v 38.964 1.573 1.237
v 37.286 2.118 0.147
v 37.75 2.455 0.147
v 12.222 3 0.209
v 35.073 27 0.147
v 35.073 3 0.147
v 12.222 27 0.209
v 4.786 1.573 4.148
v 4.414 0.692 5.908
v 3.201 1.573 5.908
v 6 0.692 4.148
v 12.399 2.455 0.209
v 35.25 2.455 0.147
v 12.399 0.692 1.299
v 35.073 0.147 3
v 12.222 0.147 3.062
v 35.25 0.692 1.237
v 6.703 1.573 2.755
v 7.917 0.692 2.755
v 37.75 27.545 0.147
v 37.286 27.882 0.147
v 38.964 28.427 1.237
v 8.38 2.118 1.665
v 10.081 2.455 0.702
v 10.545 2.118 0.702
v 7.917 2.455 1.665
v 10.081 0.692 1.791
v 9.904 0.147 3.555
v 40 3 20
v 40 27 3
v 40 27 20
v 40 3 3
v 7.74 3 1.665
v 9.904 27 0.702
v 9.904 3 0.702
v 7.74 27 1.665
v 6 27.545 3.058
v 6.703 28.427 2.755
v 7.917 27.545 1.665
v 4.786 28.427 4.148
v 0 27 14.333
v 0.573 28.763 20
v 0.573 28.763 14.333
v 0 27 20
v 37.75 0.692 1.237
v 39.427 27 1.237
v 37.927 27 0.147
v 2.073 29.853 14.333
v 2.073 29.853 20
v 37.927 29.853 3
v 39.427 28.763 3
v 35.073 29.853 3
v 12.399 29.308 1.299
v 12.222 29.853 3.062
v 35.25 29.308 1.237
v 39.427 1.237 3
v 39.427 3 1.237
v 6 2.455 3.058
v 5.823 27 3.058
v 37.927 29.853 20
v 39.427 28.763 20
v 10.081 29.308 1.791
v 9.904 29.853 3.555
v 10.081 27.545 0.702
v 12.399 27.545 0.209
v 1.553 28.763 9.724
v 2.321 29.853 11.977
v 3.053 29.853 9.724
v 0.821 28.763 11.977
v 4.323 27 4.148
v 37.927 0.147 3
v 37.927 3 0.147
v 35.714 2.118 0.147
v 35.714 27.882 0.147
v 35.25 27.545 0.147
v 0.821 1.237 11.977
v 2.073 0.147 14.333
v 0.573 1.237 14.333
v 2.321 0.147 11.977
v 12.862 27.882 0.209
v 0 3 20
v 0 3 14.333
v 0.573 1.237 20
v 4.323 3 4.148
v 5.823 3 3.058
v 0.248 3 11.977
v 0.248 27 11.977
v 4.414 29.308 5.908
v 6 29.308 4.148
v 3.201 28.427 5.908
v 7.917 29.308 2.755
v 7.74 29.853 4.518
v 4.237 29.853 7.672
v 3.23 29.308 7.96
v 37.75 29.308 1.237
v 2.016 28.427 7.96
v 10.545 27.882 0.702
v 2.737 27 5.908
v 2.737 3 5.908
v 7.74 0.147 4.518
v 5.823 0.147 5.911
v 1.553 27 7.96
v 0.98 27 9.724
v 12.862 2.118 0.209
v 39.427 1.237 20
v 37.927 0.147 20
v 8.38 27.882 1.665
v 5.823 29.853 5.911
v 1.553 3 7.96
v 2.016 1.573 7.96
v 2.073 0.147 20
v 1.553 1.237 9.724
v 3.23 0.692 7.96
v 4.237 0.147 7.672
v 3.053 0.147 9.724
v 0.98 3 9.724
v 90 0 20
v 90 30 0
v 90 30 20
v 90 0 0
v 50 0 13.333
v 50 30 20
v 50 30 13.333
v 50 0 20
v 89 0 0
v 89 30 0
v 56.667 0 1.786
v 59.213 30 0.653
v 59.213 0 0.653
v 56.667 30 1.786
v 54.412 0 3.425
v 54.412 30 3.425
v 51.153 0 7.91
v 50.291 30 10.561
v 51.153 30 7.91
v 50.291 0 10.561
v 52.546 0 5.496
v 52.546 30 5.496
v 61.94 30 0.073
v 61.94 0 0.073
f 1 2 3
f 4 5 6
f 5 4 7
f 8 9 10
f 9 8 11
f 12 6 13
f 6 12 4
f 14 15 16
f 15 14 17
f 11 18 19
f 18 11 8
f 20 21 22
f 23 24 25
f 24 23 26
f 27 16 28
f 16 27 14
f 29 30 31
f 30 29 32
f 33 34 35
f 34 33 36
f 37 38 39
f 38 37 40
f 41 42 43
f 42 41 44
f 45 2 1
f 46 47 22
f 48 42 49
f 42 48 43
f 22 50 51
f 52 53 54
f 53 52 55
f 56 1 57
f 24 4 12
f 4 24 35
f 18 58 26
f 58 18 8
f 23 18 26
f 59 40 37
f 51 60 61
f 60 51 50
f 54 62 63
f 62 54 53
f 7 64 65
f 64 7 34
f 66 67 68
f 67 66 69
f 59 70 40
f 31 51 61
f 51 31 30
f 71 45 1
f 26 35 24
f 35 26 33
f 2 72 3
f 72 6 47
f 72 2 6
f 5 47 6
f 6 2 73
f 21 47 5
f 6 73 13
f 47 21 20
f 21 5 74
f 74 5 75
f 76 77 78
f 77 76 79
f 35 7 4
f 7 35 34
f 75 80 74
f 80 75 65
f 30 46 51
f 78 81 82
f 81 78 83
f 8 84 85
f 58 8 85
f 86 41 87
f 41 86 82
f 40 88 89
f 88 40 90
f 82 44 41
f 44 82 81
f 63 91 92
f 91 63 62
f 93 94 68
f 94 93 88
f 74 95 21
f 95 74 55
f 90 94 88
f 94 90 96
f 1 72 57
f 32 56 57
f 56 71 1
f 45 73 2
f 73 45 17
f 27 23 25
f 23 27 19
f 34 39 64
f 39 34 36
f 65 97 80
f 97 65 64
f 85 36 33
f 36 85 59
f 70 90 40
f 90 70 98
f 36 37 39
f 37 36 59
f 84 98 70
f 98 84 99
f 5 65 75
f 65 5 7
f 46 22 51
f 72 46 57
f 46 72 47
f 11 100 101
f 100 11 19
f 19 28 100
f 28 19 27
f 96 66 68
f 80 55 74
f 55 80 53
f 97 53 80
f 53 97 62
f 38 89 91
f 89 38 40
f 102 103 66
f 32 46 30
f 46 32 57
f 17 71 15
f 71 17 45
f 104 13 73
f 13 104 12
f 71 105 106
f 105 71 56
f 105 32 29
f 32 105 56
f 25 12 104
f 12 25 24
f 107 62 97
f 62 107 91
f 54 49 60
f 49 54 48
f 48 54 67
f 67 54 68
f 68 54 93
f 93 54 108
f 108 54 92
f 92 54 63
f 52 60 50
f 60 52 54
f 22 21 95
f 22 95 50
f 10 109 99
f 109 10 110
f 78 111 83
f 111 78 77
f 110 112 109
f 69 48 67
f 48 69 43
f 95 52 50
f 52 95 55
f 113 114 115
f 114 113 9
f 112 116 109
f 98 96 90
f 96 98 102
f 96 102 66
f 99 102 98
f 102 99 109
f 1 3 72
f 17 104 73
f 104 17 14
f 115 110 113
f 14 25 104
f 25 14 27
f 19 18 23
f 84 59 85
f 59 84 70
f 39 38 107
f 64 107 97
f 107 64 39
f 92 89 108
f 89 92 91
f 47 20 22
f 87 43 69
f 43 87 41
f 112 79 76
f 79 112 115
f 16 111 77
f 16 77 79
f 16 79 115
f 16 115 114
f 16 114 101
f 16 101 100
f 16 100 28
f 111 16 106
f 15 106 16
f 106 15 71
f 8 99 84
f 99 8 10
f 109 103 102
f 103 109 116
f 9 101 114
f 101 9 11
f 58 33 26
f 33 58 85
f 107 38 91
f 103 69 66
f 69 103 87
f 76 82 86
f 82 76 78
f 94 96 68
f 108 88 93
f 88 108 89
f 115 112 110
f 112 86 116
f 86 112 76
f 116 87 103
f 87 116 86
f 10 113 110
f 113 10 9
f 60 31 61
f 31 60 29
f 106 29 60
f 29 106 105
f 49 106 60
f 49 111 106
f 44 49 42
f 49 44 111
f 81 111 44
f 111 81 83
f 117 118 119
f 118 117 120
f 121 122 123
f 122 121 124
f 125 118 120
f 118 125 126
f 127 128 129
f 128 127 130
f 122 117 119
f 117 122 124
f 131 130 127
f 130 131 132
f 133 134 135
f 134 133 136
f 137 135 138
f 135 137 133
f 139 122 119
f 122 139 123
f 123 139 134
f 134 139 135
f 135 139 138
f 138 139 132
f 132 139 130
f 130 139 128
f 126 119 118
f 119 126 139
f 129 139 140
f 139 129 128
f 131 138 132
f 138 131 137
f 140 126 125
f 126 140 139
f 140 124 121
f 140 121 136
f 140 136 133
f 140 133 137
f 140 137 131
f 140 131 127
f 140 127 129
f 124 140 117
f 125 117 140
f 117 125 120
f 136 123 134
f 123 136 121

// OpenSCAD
// file: ../lib/primitive/rounded_square.scad
$bleed = 1;
$rounding = 3;

module rounded_square(size, flat_top=false, flat_bottom=false) {
  assert(!(flat_top && flat_bottom), "Flat top and flat bottom are exclusive");

  rounding_height = flat_top || flat_bottom 
    ? $rounding 
    : $rounding * 2;

  offset = flat_bottom ? 0 : $rounding;

  inner_size = [
    size[0] - $rounding * 2,
    size[1] - rounding_height,
  ];

  minkowski() {
    translate([$rounding, offset]) {
      square(inner_size);
    }
    if (flat_top ) {
      difference() {
        circle($rounding);
        translate([-$rounding, 0]) {
          square([$rounding * 2, $rounding]);
        }
      }
    } else if (flat_bottom) {
      difference() {
        circle($rounding);
        translate([-$rounding, -$rounding]) {
          square([$rounding * 2, $rounding]);
        }
      }
    } else {
      circle($rounding);
    }
  }
}
// file: ../lib/primitive/rounded_cube.scad
include <./rounded_square.scad>

$bleed = 1;
$rounding = 3;

// Render a rounded cube
// flat_top: do not round the top edges
// flat_bottom: do not round the bottom edges
// flat: equals flat_top && flat_bottom
// 
// Limitations:
// requires height > $rounding * 2
// flat_top || flat_bottom requires height > $rounding
// flat_top && flat_bottom requires height > $bleed
module rounded_cube(
  size, 
  flat=false, 
  flat_top=false, 
  flat_bottom=false,
  side_rounding=-1
) {
  _flat = flat || (flat_top && flat_bottom);
  _flat_top = flat_top || flat;
  _flat_bottom = flat_bottom || flat;
  _rounding = min($rounding, size[2] / 2);
  _side_rounding = side_rounding > -1 ? side_rounding: $rounding;

  assert(_side_rounding >= $rounding, "side rounding cannot be less than rounding");

  top_height = _flat_top ? 0: _rounding;
  bottom_height = _flat_bottom ? 0: _rounding;

  cube_size = [
    size[0] - _rounding * 2,
    size[1] - _rounding * 2,
    size[2] - (top_height + bottom_height)
  ];

  if (_flat_top && _flat_bottom) {
     linear_extrude(cube_size[2]) {
       rounded_square([size[0], size[1]]);
     }
   } else {
     minkowski() {
       translate([_rounding, _rounding, bottom_height]) {
         if (_side_rounding != _rounding) {
           linear_extrude(cube_size[2]) {
             rounded_square([cube_size[0], cube_size[1]], $rounding=_side_rounding);
           }
         } else {
           cube(cube_size);
         }
       }

       if (_flat_top) {
         difference() {
           sphere(_rounding);
           cylinder(_rounding, _rounding, _rounding);
         }
       } else if (_flat_bottom) {
         difference() {
           sphere(_rounding);
           translate ([0, 0, -_rounding]) {
             cylinder(_rounding, _rounding, _rounding);
           }
         }
       } else {
         sphere(_rounding);
       }
    }
  }
}
// file: ../lib/primitive/scoop.scad
include <./rounded_cube.scad>

$bleed = 0.1;
$rounding = 3;
$wall_thickness = 2;

module cylinder_quarter(height, radius) {
  cube_size = (radius + $bleed) * 2;
  cube_height = height + $bleed * 2;
  half_cube_size = cube_size / 2;

  difference() {
    cylinder(height, r=radius);

    translate([0, -half_cube_size, -$bleed]) {
      cube([cube_size, cube_size, cube_height]);
    }
    translate([-half_cube_size, -cube_size, -$bleed]) {
      cube([cube_size, cube_size, cube_height]);
    }
  }
}

module _unrounded_scoop(size, radius, edge="left") {
  _size = edge == "left"
    ? size
    : [size[1], size[0], size[2]];

  rotation = edge == "left"
    ? [0, 0, 0]
    : [0, 0, 90];

  rotation_offset = edge == "left"
    ? [0, 0, 0]
    : [size[0], 0, 0];

  min_radius = min(
    radius ? radius : _size[2],
    _size[2],
    _size[0] / 3
  );

  translate(rotation_offset) {
    rotate(rotation) {
      hull() {
        translate([_size[0] -1, 0, 0]) {
          cube([1, _size[1], _size[2]]);
        }
        translate([0, 0, _size[2] - 1]) {
          cube([_size[0], _size[1], 1]);
        }
        translate([min_radius, 0, min_radius]) rotate([-90, 0, 0]) {
          cylinder_quarter(_size[1], min_radius);
        }
      }
    }
  }
}

module scoop(size, radius = 0, rounded=true, edge="left") {
  min_radius = min(
    radius ? radius : size[2],
    size[2],
    size[0] / 3
  );

  unrounded_size = [
    size[0] - $rounding * 2,
    size[1] - $rounding * 2,
    size[2] - $rounding,
  ];

  if (rounded) {
    difference() {
      translate([$rounding, $rounding, $rounding]) {
        minkowski() {
          _unrounded_scoop(unrounded_size, radius, edge=edge);

          // round with a sphere
          sphere($rounding);
        }
      }

      // slice off the top
      translate([-$bleed, -$bleed, size[2]]) {
        cube([
          size[0] + $bleed * 2,
          size[1] + $bleed * 2,
          $rounding +  $bleed * 2
        ]);
      }
    }
  } else {
    _unrounded_scoop(size, radius, edge=edge);
  }
}
// main file
include <../lib/primitive/scoop.scad>

dimensions = [40, 30, 20];

scoop(dimensions);

translate([dimensions[0] + 10, 0, 0]) {
  scoop(dimensions, rounded=false);
}
